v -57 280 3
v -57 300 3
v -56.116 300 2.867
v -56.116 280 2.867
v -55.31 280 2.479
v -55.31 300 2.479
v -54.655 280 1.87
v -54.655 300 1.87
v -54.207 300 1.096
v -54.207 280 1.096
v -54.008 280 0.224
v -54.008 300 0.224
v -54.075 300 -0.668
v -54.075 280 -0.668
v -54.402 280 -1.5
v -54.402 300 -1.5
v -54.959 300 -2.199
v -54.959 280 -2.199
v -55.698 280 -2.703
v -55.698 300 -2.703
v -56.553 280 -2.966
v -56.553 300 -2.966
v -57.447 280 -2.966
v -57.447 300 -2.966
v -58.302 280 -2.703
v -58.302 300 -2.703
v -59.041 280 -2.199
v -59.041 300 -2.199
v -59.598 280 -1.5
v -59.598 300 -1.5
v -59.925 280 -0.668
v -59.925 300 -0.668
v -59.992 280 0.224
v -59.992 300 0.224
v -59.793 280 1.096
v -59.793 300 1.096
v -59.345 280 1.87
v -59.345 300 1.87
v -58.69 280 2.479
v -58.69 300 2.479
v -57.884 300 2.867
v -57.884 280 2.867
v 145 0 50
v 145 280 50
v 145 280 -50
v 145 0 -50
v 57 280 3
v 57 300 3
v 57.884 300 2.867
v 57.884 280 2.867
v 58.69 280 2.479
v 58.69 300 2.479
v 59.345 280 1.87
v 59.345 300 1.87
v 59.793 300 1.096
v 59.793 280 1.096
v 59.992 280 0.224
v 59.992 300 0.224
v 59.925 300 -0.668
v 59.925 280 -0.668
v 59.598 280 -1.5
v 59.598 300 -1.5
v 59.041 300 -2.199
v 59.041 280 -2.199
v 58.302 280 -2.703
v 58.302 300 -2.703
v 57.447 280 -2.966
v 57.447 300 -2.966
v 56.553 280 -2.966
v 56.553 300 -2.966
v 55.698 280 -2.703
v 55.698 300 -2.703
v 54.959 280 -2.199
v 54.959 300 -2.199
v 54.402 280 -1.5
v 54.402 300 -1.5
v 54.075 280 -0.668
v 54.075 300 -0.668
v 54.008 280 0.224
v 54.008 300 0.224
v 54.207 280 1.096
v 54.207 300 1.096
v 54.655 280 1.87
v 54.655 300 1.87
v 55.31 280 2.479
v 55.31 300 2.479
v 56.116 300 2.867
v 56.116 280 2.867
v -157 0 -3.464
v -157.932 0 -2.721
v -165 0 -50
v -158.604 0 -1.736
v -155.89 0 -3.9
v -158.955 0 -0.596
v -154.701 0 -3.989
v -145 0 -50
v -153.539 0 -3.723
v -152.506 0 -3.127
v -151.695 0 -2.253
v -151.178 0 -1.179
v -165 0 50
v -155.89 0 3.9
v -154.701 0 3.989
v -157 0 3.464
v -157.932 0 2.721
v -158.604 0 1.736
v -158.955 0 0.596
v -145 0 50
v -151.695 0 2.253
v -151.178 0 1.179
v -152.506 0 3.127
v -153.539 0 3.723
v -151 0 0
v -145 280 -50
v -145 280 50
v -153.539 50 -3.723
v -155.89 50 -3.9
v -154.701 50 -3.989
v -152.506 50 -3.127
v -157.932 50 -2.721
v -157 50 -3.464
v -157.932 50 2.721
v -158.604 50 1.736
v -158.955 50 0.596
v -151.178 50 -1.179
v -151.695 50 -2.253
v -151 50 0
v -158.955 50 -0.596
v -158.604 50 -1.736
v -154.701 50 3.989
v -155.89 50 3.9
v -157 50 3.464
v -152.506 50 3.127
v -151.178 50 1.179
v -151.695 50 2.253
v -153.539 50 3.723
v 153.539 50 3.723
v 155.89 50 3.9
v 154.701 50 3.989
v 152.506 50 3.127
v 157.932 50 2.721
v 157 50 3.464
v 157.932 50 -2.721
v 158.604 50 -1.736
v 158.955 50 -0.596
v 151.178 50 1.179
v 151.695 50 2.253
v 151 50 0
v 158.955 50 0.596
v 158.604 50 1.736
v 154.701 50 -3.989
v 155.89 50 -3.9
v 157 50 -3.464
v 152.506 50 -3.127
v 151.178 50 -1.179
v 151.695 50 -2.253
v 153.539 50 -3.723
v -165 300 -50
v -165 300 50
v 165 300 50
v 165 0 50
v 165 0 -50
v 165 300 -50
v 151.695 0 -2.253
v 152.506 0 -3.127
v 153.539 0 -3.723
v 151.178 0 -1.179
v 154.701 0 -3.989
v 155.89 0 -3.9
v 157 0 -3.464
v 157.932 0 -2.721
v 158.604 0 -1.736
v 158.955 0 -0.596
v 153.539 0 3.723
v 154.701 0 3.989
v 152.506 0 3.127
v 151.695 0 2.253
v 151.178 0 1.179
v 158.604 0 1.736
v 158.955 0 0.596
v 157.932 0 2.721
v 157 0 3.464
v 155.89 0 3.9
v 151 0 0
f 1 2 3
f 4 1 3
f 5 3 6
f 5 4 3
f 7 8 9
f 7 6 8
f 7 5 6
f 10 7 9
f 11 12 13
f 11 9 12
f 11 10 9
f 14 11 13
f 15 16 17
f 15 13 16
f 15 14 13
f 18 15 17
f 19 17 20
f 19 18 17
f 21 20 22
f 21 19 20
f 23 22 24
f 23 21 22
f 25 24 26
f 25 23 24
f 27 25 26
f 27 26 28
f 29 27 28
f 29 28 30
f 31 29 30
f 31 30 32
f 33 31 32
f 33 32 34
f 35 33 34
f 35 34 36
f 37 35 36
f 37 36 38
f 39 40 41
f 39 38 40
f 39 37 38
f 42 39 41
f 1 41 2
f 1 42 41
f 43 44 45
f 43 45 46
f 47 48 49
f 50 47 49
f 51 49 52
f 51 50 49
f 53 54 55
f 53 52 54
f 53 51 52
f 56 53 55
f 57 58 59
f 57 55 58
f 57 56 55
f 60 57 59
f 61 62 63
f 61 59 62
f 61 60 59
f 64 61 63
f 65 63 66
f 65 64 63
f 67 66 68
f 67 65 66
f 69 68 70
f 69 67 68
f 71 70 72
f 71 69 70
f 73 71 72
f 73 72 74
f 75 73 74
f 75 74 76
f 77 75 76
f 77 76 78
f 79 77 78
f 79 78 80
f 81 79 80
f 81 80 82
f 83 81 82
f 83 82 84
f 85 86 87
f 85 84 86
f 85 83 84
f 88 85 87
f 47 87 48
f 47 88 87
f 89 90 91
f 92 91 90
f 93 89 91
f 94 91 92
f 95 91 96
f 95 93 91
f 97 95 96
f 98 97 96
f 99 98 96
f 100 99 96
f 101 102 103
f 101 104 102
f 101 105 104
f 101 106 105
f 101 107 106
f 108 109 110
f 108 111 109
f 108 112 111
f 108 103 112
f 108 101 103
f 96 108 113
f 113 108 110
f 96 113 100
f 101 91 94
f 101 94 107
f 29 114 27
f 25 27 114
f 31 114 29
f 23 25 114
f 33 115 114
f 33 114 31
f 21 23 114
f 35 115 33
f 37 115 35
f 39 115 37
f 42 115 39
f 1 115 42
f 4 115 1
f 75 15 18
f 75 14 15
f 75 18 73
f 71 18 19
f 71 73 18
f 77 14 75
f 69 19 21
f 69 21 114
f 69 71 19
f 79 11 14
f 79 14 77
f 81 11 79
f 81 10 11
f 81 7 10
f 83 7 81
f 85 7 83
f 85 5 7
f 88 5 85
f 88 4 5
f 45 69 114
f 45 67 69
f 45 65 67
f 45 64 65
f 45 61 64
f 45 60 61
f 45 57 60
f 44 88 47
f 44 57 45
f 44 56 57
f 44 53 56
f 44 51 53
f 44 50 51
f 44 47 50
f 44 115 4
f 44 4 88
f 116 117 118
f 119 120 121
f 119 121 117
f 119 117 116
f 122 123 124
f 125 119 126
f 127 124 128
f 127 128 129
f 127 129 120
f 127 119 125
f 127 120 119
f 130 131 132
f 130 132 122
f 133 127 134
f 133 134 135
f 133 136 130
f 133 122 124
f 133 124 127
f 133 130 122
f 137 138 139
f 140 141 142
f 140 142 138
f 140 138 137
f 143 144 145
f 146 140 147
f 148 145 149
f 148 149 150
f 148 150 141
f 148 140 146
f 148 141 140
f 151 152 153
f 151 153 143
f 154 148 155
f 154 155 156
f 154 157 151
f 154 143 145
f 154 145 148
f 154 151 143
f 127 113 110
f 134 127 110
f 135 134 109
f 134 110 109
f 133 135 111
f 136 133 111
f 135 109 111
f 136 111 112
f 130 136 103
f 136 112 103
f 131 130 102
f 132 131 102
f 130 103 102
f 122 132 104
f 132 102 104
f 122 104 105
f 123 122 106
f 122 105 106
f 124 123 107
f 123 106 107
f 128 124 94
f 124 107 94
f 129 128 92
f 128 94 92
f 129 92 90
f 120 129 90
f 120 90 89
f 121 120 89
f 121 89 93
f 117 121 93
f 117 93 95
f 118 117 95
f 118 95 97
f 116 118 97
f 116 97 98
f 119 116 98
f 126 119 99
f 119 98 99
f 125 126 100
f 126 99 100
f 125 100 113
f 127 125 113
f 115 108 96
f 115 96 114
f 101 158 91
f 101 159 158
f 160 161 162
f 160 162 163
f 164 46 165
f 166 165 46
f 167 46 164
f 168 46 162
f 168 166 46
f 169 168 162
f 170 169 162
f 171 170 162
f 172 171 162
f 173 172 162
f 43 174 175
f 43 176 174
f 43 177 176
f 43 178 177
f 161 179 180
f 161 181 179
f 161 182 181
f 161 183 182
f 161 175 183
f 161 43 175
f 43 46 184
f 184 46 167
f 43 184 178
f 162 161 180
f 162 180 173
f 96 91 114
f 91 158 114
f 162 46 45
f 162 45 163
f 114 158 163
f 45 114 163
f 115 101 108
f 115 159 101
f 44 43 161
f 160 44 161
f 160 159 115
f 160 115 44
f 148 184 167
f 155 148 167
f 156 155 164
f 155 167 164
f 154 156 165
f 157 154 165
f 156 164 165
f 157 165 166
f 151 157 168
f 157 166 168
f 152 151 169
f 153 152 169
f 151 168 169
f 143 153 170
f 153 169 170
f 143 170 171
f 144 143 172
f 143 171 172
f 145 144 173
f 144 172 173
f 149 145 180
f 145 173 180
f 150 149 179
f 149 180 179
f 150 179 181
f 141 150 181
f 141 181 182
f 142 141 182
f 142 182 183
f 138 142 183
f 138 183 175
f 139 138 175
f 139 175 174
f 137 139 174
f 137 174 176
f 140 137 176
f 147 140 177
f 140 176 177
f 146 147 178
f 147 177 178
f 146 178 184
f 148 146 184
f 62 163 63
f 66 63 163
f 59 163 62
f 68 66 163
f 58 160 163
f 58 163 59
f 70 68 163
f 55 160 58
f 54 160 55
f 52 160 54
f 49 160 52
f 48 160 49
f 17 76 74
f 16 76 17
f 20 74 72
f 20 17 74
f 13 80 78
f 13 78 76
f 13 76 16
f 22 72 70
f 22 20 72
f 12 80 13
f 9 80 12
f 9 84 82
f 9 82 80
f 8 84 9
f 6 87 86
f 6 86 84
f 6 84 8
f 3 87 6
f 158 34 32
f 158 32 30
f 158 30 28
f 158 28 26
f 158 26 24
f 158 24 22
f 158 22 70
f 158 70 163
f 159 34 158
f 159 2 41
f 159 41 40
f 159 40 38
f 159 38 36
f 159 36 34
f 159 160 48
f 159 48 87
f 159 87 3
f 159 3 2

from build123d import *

# Parameters (mm, degrees)
BOSS_EXTRUDE1_DEPTH     = 50
SKETCH2_R               = 4
CUT_EXTRUDE1_DEPTH      = 50
CUT_EXTRUDE2_DEPTH      = 347.013005536
CUT_EXTRUDE2_DEPTH_BACK = 347.013005536
SKETCH3_R               = 3


with BuildPart() as part:
    # Sketch1 → Boss-Extrude1 (new, symmetric)
    with BuildSketch(Plane.XY):
        Polygon((-165, 0), (-145, 0), (-145, 280), (145, 280), (145, 0), (165, 0), (165, 300), (-165, 300), align=None)
    extrude(amount=BOSS_EXTRUDE1_DEPTH, both=True)

    # Sketch2 → Cut-Extrude1 (cut)
    with BuildSketch(Plane.XZ):
        with Locations((-155, 0)):
            Circle(SKETCH2_R)
        with Locations(Location((155, 0, 0), (0, 0, 180))):
            Circle(SKETCH2_R)
    extrude(amount=-CUT_EXTRUDE1_DEPTH, mode=Mode.SUBTRACT)

    # Sketch3 → Cut-Extrude2 (cut, two sides: drawn at the far end of the back side and taken through both)
    with BuildSketch(Plane(origin=(0, 300, 0), x_dir=(1, 0, 0), z_dir=(0, 1, 0)).offset(-CUT_EXTRUDE2_DEPTH_BACK)):
        with Locations(Location((-57, 0, 0), (0, 0, 270))):
            Circle(SKETCH3_R)
        with Locations(Location((57, 0, 0), (0, 0, 270))):
            Circle(SKETCH3_R)
    extrude(amount=CUT_EXTRUDE2_DEPTH + CUT_EXTRUDE2_DEPTH_BACK, mode=Mode.SUBTRACT)


solid = part.part
